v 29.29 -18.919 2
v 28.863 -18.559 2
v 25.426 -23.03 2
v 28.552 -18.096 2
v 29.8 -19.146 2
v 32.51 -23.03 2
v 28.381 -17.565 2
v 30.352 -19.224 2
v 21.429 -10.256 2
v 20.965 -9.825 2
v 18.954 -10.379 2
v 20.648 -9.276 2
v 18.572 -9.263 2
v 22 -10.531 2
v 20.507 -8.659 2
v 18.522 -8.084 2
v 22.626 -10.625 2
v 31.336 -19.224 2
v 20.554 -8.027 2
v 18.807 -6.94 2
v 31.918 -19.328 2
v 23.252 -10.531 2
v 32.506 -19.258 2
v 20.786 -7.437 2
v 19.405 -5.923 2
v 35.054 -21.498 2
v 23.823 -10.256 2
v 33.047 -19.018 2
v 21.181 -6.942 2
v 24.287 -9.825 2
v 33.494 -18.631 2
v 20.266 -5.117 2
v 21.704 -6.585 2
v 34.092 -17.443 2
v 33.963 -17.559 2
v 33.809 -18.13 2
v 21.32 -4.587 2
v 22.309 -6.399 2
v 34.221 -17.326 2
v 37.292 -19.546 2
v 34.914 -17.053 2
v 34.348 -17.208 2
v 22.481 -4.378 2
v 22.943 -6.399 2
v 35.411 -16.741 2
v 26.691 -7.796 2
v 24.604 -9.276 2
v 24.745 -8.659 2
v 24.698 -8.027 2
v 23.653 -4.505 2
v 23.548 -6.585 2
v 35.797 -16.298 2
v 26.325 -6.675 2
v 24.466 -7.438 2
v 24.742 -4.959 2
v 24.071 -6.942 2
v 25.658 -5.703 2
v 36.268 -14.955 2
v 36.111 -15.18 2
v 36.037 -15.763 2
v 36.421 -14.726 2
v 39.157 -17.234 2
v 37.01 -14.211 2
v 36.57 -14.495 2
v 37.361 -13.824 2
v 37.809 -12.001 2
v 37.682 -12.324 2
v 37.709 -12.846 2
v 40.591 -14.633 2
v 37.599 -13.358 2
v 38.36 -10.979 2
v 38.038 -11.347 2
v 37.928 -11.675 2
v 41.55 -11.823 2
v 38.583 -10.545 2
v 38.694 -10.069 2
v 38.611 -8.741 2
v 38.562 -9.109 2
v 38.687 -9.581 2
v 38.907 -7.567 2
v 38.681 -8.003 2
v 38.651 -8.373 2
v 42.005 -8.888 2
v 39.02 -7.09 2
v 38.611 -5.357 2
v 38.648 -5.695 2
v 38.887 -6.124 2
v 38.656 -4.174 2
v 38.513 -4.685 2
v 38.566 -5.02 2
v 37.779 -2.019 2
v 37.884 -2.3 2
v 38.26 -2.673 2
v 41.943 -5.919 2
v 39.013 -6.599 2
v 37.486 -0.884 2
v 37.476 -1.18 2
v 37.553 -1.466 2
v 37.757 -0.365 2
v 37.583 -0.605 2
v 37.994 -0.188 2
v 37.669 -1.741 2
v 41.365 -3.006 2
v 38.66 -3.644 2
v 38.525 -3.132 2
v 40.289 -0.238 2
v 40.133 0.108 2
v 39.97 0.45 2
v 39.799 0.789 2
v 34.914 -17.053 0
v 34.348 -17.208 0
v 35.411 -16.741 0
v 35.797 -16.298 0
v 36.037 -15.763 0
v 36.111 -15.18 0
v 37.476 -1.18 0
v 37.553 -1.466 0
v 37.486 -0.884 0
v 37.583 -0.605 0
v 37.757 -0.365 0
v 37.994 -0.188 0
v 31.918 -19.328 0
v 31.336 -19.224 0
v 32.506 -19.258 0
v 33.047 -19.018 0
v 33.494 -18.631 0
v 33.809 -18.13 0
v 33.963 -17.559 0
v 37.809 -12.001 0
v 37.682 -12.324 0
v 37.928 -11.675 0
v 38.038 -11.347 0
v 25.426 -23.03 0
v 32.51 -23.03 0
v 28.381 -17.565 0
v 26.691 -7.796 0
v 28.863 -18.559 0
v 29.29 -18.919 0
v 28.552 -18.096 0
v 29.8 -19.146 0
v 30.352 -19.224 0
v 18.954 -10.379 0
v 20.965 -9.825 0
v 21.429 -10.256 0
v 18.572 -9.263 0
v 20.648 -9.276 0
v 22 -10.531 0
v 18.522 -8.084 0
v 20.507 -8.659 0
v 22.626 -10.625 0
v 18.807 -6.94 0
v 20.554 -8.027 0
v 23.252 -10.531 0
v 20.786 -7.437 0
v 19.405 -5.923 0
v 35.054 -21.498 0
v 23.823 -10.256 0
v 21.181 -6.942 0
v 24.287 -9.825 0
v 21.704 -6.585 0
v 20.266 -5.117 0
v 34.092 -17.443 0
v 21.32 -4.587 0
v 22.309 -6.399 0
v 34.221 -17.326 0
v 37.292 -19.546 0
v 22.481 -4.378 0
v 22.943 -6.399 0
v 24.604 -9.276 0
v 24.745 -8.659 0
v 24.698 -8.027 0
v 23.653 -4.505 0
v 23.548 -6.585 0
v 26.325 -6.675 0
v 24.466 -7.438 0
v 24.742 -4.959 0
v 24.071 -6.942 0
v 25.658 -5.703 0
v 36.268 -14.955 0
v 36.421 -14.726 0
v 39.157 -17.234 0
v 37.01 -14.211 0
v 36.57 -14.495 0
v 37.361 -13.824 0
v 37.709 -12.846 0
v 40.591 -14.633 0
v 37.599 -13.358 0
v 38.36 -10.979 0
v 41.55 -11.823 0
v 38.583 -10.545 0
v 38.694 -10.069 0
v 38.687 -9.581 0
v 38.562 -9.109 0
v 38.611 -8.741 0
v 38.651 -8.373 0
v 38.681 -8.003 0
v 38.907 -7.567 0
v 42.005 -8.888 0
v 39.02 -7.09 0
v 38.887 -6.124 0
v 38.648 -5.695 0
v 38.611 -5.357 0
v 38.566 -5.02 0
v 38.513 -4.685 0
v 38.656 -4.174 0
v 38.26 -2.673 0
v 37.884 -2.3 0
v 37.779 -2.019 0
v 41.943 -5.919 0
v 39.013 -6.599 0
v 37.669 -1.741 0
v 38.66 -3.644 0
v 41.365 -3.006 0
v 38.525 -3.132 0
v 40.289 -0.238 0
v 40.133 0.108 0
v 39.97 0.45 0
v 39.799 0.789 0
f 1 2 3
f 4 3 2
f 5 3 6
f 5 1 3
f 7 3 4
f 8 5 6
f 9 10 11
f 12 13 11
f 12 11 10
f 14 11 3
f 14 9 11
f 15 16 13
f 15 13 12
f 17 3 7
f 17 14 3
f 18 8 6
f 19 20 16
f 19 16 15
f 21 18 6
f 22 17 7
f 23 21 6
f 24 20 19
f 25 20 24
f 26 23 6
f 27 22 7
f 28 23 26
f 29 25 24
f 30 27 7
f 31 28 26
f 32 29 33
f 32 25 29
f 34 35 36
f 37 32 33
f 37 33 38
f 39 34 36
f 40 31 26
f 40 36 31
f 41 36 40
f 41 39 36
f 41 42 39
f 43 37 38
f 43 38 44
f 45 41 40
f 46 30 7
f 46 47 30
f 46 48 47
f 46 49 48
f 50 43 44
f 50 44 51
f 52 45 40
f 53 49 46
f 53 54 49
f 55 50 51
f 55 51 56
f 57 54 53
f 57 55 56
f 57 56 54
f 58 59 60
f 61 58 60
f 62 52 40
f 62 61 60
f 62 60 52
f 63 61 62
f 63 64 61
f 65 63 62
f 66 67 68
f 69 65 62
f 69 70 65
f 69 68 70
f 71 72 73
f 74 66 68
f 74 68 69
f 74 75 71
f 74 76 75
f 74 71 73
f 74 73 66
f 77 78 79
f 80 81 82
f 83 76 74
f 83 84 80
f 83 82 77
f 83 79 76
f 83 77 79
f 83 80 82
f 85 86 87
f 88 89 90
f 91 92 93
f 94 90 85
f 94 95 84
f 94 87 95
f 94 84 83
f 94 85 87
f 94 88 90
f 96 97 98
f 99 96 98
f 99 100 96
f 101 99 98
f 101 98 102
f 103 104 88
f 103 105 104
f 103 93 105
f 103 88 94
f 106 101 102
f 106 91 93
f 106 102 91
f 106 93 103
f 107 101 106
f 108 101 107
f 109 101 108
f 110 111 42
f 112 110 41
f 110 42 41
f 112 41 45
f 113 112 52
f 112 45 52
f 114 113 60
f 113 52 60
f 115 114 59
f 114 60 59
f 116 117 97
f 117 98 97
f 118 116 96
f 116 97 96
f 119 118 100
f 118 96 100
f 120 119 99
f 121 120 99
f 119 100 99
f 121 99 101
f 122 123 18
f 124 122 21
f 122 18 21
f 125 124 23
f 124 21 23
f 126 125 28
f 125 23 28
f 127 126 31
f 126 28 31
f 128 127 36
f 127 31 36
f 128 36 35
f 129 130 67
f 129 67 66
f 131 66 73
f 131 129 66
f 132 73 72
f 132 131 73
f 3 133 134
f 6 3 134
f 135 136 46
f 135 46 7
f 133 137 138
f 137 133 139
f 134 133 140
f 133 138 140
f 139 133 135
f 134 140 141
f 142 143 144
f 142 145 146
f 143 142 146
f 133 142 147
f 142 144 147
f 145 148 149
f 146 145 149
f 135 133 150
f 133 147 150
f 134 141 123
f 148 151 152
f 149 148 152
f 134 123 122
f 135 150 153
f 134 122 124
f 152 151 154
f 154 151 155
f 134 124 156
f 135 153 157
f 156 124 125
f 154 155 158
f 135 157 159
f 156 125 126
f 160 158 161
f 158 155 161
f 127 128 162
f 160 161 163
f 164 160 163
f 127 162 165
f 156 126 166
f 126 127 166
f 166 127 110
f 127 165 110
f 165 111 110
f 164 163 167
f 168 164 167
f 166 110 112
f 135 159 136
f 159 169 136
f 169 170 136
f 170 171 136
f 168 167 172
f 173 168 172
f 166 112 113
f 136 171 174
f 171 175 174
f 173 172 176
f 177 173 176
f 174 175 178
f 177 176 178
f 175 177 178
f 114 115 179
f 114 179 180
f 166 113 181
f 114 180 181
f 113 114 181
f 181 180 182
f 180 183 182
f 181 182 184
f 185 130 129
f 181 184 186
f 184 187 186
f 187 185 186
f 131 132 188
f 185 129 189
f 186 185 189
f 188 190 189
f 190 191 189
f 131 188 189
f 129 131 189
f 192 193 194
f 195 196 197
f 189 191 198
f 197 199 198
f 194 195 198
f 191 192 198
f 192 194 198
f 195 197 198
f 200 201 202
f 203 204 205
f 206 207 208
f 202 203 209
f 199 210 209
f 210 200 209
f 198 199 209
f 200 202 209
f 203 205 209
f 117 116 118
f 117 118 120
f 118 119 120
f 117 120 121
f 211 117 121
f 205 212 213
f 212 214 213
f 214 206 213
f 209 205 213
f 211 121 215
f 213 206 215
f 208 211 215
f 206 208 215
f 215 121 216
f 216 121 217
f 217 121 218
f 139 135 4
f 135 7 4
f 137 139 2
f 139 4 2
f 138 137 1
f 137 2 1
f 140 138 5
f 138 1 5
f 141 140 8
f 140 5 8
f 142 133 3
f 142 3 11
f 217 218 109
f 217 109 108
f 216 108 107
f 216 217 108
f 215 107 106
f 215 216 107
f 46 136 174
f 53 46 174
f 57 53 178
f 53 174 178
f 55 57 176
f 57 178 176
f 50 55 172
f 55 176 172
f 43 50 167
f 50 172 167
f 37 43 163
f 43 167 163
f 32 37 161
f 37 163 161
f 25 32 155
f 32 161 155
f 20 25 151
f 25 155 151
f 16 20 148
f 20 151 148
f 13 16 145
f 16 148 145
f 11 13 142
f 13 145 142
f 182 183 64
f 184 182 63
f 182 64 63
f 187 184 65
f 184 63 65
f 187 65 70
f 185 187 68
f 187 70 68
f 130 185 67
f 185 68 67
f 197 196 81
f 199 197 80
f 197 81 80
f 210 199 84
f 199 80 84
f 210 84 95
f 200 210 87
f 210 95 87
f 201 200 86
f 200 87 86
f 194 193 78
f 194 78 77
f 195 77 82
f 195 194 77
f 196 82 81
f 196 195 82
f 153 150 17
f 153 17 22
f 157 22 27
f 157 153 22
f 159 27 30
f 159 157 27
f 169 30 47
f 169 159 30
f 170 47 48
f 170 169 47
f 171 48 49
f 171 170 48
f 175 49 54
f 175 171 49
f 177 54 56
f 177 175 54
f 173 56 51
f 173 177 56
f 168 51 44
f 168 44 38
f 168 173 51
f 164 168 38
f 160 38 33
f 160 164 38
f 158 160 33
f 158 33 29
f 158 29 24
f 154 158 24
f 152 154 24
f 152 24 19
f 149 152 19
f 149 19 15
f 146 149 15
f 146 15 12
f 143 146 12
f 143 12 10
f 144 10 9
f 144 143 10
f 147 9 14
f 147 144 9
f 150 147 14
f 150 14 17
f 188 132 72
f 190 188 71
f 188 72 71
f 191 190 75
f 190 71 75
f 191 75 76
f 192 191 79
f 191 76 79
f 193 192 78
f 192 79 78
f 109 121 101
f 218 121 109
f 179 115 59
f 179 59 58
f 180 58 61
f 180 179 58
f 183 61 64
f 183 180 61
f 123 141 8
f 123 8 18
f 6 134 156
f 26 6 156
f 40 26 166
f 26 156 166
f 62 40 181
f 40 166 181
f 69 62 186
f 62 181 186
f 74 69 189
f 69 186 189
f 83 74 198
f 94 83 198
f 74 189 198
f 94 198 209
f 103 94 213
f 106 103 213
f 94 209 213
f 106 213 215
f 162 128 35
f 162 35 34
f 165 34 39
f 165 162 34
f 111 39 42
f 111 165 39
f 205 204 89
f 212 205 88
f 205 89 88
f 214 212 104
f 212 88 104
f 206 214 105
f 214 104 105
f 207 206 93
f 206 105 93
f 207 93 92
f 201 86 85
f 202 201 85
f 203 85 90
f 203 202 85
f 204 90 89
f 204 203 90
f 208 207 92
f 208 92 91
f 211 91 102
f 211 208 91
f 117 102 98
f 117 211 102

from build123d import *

# Parameters (mm, degrees)
ESQUISSE1_R             = 4.125
ESQUISSE1_R_2           = 2.125
BOSS_EXTRU_1_DEPTH      = 2
BOSS_EXTRU_2_START      = -2
BOSS_EXTRU_2_DEPTH      = 2
ENL_V_MAT_EXTRU_1_DEPTH = 48.690657123
BOSS_EXTRU_3_START      = -2
BOSS_EXTRU_3_DEPTH      = 2
CONG_1_R                = 1
CONG_2_R                = 2


with BuildPart() as part:
    # Esquisse1 → Boss.-Extru.1 (new body)
    with BuildSketch(Plane.XY):
        with Locations(Location((22.625964543, -8.5, 0), (0, 0, 270))):
            Circle(ESQUISSE1_R)
        with Locations(Location((22.625964543, -8.5, 0), (0, 0, 270))):
            Circle(ESQUISSE1_R_2, mode=Mode.SUBTRACT)
    extrude(amount=BOSS_EXTRU_1_DEPTH)

    # Esquisse2 → Boss.-Extru.2 (add)
    with BuildSketch(Plane.XY.offset(2).offset(BOSS_EXTRU_2_START)):
        with BuildLine():
            Line((30.509764166, -23.030033129), (25.42611418, -23.030033129))
            Line((25.42611418, -23.030033129), (18.953657758, -10.378772971))
            ThreePointArc((18.953657758, -10.378772971), (23.931920923, -12.412812663), (26.690529558, -7.796482951))
            Line((26.690529558, -7.796482951), (28.668432745, -19.223805295))
            Line((28.668432745, -19.223805295), (31.625964543, -19.223805295))
            ThreePointArc((31.625964543, -19.223805295), (38.131775725, -11.04447664), (37.160125022, -0.638570082))
            Line((37.160125022, -0.638570082), (39.798855089, 0.788701312))
            ThreePointArc((39.798855089, 0.788701312), (40.551713625, -13.225604632), (30.509764166, -23.030033129))
        make_face()
    extrude(amount=BOSS_EXTRU_2_DEPTH)

    # Esquisse3 → Enlèv. mat.-Extru.1 (cut, through all)
    with BuildSketch(Plane.XY.offset(2)):
        with BuildLine():
            ThreePointArc((38.167376486, -5.226235195), (36.438745559, -1.907826674), (35.54029783, -5.540014951))
            ThreePointArc((35.54029783, -5.540014951), (35.031758868, -6.882600454), (35.553780718, -8.220001253))
            ThreePointArc((35.553780718, -8.220001253), (34.75530459, -9.413141471), (34.961960594, -10.833859953))
            ThreePointArc((34.961960594, -10.833859953), (33.914765028, -11.815964406), (33.795387502, -13.246662387))
            ThreePointArc((33.795387502, -13.246662387), (32.553529245, -13.967034361), (32.114280515, -15.333858513))
            ThreePointArc((32.114280515, -15.333858513), (30.552699493, -18.734073905), (33.972916342, -17.21680112))
            ThreePointArc((33.972916342, -17.21680112), (35.668723842, -16.476130338), (36.031089318, -14.661454735))
            ThreePointArc((36.031089318, -14.661454735), (37.515935524, -13.55710514), (37.459320378, -11.707469768))
            ThreePointArc((37.459320378, -11.707469768), (38.656556802, -10.296448426), (38.183883536, -8.507332369))
            ThreePointArc((38.183883536, -8.507332369), (39.031708248, -6.862476892), (38.167376486, -5.226235195))
        make_face()
    extrude(amount=-ENL_V_MAT_EXTRU_1_DEPTH, mode=Mode.SUBTRACT)

    # Esquisse4 → Boss.-Extru.3 (add)
    with BuildSketch(Plane.XY.offset(2).offset(BOSS_EXTRU_3_START)):
        with BuildLine():
            Line((30.509764166, -23.030033129), (32.509764166, -23.030033129))
            ThreePointArc((32.509764166, -23.030033129), (41.131762211, -13.249116028), (40.289284919, -0.23775862))
            ThreePointArc((40.289284919, -0.23775862), (40.336178222, -13.75207443), (30.509764166, -23.030033129))
        make_face()
    extrude(amount=BOSS_EXTRU_3_DEPTH)

    # Congé1
    cong_1_edges = [part.edges().sort_by_distance(p)[0] for p in [
        (37.160125022, -0.638570082, 1),
    ]]
    fillet(cong_1_edges, radius=CONG_1_R)

    # Congé2
    cong_2_edges = [part.edges().sort_by_distance(p)[0] for p in [
        (28.668432745, -19.223805295, 1),
    ]]
    fillet(cong_2_edges, radius=CONG_2_R)


solid = part.part
